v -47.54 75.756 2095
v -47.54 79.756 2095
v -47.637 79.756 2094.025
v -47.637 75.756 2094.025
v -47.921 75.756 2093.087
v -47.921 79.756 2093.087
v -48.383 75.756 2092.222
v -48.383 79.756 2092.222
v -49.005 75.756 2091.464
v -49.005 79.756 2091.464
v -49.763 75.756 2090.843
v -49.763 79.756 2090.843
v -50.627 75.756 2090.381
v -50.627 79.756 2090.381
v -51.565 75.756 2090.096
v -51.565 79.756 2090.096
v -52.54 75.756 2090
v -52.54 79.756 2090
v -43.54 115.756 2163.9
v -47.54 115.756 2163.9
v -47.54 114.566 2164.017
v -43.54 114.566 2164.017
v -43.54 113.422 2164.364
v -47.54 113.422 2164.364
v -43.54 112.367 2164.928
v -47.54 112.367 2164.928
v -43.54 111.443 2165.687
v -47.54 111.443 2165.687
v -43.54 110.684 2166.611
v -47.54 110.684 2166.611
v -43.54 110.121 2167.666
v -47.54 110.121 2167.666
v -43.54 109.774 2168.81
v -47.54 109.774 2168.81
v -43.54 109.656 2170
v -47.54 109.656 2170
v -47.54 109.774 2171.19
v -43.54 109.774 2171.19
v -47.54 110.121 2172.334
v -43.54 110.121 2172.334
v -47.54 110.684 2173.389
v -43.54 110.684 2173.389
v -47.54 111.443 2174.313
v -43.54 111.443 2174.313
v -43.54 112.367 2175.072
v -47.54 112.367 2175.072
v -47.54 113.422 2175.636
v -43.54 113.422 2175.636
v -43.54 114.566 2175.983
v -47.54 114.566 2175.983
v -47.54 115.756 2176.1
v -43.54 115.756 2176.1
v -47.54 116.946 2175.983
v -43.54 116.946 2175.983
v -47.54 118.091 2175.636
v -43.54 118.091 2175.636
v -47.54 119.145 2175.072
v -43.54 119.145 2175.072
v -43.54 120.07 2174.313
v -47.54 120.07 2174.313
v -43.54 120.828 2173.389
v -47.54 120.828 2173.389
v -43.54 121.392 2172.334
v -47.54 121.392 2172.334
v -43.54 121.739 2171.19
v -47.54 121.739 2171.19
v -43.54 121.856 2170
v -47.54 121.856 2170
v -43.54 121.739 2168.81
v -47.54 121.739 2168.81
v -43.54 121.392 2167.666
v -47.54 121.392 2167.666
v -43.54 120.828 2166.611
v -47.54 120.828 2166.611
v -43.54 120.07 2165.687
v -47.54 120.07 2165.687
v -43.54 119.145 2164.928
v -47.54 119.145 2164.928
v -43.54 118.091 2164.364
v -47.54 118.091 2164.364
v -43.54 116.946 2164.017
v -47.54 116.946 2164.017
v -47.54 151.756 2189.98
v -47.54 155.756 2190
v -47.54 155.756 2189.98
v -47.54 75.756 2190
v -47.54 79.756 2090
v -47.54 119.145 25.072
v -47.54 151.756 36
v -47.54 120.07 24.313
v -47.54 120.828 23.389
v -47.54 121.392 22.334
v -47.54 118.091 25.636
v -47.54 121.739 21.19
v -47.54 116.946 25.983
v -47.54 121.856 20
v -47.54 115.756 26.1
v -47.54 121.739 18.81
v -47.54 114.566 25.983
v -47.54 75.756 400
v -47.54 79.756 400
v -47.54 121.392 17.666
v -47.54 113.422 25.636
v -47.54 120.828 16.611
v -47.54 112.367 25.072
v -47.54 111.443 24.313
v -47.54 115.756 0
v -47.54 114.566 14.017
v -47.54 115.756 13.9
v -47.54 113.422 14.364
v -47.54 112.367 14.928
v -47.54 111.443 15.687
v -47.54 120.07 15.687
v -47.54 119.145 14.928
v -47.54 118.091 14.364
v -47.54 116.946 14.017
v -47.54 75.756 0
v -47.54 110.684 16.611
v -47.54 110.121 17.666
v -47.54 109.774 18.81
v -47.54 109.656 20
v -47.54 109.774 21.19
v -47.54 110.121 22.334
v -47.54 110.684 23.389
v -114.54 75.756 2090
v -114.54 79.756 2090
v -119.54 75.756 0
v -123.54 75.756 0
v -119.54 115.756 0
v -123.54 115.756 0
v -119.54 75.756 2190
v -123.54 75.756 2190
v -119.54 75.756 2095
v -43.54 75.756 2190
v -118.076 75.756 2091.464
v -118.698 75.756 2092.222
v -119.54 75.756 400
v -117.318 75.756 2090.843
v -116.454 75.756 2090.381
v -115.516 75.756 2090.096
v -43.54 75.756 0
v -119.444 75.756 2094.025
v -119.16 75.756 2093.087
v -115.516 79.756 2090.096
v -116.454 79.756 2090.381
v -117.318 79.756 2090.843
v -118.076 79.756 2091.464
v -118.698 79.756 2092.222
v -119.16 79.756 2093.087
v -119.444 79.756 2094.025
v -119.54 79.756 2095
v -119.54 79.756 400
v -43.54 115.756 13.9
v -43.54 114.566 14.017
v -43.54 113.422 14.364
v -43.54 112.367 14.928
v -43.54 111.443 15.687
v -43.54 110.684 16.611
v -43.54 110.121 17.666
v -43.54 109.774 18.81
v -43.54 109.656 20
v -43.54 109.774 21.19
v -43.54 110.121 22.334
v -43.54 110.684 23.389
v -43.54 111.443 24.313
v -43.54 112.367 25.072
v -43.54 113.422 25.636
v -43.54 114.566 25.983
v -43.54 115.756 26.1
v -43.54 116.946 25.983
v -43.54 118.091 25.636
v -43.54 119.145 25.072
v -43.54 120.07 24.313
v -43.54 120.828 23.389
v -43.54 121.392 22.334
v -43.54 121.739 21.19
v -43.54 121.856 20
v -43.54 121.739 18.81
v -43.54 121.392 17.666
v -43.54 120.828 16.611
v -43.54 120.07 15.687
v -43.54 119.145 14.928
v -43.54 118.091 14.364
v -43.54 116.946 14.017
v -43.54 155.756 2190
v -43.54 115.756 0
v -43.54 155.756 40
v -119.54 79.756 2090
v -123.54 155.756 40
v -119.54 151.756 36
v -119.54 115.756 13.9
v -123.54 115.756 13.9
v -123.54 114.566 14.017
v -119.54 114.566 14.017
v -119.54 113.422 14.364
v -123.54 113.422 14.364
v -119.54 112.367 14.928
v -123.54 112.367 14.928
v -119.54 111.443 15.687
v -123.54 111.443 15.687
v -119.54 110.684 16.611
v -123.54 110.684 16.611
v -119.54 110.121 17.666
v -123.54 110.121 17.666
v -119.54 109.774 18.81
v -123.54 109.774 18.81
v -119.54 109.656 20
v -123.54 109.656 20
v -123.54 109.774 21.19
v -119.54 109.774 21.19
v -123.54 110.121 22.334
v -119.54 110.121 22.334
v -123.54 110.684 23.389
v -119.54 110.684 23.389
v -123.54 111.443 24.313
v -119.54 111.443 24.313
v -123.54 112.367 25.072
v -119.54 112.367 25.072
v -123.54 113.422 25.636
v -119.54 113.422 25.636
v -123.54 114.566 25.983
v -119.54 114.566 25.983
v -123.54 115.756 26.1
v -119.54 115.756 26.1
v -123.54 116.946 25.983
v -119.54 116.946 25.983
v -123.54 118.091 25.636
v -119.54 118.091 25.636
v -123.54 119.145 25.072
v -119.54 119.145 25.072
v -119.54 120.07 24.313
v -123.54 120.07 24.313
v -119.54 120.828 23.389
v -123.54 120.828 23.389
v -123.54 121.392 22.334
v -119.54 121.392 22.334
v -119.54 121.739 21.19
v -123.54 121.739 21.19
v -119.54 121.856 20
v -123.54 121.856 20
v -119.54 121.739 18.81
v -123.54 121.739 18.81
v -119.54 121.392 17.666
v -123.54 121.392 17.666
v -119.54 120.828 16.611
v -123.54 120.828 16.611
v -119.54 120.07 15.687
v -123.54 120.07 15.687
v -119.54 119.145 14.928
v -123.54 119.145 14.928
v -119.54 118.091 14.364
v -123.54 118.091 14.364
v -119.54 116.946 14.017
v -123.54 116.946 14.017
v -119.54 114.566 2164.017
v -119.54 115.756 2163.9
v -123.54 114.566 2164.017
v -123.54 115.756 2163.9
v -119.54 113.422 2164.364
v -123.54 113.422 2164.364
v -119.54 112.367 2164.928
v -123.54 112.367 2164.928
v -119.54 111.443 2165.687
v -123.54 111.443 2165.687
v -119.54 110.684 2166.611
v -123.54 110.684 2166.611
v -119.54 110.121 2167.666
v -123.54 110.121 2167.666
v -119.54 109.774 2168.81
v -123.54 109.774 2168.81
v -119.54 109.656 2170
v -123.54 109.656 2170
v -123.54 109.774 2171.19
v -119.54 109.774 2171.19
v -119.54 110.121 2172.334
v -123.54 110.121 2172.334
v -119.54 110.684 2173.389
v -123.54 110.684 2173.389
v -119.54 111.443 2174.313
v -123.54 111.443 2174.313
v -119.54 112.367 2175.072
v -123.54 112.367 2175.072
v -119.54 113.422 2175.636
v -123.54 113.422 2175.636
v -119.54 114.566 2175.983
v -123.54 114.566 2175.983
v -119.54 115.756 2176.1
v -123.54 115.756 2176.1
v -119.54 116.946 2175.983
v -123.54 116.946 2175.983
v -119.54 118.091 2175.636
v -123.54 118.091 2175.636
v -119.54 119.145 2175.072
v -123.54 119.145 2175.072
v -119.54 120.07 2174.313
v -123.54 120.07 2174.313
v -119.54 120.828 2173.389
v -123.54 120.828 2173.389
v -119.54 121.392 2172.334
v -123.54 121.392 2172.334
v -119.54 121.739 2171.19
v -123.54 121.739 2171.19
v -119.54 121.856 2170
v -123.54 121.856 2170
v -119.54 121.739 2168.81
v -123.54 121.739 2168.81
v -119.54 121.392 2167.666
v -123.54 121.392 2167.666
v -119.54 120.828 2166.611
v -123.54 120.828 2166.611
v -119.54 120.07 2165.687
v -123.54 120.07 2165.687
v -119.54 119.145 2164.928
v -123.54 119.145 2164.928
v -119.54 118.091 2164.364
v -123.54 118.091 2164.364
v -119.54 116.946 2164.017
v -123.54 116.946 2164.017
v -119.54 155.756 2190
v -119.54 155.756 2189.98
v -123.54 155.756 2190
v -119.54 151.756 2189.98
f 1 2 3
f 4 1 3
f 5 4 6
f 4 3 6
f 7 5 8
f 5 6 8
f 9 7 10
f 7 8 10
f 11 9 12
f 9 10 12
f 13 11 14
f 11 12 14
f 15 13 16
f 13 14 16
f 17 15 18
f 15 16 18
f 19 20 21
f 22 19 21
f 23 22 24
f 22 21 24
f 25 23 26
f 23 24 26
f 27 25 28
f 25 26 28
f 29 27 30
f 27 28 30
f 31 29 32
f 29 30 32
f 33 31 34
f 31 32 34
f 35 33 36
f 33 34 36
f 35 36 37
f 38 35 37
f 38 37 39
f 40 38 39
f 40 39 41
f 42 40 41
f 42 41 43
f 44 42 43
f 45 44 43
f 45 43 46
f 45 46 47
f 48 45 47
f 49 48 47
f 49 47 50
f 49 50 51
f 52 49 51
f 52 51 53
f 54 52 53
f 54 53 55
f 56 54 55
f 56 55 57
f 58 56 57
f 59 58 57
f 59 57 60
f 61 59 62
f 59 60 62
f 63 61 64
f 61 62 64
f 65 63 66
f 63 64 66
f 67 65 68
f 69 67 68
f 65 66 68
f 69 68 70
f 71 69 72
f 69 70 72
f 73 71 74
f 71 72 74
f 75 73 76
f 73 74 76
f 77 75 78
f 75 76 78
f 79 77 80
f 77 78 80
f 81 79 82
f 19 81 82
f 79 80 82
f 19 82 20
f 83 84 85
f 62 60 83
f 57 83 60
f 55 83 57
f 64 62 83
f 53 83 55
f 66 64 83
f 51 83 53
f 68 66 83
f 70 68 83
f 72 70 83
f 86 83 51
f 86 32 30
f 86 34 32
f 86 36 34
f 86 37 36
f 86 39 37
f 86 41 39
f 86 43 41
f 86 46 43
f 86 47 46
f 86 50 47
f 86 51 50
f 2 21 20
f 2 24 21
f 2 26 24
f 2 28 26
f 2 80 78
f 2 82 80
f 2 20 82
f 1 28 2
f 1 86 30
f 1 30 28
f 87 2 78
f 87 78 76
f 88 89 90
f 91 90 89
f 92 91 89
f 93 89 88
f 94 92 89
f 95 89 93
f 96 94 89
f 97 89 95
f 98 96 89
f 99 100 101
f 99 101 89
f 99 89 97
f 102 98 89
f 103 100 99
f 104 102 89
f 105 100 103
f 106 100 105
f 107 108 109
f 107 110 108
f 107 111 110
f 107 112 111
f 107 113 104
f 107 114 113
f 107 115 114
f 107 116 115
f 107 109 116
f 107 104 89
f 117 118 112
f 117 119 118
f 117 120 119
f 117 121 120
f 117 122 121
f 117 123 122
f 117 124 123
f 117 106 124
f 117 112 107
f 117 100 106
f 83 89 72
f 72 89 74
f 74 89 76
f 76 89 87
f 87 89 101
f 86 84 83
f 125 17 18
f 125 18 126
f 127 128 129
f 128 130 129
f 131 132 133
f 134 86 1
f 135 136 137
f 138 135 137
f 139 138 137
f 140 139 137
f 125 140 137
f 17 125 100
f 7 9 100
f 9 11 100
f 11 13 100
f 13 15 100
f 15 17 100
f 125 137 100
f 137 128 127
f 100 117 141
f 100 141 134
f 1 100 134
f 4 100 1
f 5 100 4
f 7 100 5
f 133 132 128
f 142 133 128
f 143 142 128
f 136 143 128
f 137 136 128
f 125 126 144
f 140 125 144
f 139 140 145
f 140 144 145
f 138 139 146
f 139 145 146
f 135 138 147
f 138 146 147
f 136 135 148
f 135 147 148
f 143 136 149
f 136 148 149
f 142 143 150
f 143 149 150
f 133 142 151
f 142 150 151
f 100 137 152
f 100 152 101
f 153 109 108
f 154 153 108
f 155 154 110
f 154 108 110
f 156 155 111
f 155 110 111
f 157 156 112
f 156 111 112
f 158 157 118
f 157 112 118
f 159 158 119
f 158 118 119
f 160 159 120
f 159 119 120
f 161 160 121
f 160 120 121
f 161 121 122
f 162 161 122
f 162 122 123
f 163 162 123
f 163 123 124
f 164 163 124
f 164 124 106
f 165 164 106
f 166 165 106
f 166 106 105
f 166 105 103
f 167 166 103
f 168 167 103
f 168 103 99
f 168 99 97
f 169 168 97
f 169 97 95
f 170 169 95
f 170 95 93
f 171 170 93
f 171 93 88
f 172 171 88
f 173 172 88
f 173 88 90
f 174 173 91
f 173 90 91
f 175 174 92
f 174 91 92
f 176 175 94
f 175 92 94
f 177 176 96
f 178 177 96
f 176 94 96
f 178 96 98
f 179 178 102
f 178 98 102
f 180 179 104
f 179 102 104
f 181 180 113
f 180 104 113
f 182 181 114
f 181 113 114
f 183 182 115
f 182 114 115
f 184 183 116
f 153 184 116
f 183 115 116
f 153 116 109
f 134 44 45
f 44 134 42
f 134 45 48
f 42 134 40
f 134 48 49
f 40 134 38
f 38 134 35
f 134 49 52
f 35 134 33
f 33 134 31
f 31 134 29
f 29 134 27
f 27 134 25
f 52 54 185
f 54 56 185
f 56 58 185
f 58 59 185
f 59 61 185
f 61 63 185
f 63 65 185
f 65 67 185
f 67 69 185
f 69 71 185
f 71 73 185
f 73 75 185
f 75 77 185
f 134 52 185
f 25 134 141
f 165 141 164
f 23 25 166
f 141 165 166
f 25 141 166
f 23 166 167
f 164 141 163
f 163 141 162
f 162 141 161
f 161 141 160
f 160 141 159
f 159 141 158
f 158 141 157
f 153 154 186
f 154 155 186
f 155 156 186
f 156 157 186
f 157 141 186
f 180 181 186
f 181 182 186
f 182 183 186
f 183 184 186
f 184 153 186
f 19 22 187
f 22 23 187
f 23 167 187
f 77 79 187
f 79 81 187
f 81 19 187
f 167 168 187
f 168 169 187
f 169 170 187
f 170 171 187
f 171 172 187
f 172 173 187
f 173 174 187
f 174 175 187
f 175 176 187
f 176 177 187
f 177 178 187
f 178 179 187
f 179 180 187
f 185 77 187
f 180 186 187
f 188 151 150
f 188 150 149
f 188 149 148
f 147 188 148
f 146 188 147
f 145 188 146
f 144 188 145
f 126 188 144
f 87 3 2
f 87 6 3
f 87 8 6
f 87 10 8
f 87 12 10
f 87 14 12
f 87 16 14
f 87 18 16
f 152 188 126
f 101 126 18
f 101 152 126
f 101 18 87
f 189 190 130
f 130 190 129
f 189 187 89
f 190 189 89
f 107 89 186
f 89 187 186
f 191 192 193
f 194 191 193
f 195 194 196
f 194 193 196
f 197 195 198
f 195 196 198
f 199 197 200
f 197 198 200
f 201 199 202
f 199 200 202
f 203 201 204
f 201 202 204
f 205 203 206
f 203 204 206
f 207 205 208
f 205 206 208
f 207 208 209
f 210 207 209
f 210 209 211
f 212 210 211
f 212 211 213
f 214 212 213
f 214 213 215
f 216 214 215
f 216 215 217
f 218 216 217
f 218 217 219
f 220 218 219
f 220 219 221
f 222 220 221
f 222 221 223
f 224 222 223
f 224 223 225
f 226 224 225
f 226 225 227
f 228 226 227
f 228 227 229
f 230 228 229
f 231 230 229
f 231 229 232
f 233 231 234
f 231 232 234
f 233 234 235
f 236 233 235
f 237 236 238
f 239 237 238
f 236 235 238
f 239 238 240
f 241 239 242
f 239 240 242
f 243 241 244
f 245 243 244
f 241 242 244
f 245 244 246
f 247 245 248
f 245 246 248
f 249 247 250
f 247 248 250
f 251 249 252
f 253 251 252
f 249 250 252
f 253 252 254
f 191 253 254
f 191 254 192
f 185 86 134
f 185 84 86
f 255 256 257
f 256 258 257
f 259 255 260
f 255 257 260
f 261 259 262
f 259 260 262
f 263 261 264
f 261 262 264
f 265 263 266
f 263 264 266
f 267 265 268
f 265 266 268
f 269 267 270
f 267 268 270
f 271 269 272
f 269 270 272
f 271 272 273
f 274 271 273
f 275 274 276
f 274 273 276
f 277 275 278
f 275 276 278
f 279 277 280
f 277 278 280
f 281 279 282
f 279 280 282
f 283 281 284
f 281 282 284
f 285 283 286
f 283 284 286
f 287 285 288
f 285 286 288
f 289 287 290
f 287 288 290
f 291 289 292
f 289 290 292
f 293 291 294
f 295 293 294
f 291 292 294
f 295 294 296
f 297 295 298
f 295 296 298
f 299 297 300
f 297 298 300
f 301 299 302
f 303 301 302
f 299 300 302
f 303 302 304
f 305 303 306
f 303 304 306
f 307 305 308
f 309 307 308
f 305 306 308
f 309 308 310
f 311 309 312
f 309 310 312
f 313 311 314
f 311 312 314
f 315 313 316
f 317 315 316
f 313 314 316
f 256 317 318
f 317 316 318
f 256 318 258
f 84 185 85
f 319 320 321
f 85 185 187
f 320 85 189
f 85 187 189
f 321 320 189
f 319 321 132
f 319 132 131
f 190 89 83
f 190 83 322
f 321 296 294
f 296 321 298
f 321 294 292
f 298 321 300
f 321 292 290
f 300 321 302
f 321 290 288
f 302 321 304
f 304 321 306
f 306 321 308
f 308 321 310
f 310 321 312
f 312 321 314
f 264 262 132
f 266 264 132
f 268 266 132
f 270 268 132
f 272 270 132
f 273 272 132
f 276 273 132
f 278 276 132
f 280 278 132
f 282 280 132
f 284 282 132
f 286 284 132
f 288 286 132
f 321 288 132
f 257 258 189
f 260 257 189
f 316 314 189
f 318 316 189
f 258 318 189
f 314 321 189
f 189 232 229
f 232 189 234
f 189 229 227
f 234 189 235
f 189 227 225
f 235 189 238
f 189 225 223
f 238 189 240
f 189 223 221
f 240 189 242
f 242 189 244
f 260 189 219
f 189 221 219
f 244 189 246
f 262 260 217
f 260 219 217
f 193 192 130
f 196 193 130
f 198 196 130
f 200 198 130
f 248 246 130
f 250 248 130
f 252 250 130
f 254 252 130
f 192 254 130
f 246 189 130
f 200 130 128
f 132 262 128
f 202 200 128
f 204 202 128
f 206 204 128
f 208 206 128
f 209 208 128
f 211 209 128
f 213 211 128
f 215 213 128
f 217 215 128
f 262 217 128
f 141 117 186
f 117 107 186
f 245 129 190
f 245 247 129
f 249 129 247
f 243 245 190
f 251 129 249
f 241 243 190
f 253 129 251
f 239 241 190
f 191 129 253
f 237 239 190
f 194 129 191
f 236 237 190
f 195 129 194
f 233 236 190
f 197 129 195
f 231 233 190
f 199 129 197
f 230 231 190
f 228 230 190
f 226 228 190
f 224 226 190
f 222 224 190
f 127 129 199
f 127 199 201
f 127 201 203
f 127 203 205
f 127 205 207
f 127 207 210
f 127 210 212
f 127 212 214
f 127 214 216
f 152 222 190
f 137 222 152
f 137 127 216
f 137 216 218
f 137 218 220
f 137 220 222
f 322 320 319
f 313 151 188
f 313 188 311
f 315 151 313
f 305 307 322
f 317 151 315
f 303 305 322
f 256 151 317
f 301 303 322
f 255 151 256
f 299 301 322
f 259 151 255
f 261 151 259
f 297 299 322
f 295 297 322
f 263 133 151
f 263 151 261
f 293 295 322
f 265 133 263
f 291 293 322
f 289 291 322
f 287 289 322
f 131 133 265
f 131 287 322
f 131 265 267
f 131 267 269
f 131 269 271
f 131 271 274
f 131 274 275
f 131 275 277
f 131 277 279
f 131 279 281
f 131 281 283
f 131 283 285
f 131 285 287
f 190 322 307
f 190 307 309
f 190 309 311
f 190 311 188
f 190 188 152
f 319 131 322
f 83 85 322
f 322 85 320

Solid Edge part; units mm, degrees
sketch "Sketch1" plane through (0, 0, 0) normal (0, 0, 1) x (1, 0, 0)
  line L0 (-119.5405, 79.7564) -> (-47.5405, 79.7564)
  line L1 (-47.5405, 79.7564) -> (-47.5405, 151.7564)
  line L2 (-47.5405, 151.7564) -> (-119.5405, 151.7564)
  line L3 (-119.5405, 151.7564) -> (-119.5405, 79.7564)
  line L4 (-123.5405, 75.7564) -> (-43.5405, 75.7564)
  line L5 (-43.5405, 75.7564) -> (-43.5405, 155.7564)
  line L6 (-43.5405, 155.7564) -> (-123.5405, 155.7564)
  line L7 (-123.5405, 155.7564) -> (-123.5405, 75.7564)
  dimension "D1" = 80
  dimension "D2" = 80
  dimension "D3" = 4
  dimension "D4" = 4
extrude "Protrusion1" add sketch "Sketch1" along normal blind 2190
sketch "Sketch2" plane through (-123.5405, 105.7564, 960) normal (-1, 0, 0) x (0, 0, -1)
  circle A0 centre (940, -10) radius 6.1
  circle A1 centre (-1210, -10) radius 6.1
  dimension "D1" = 12.2
  dimension "D2" = 12.2
  dimension "D3" = 20
  dimension "D4" = 20
extrude "Cutout1" cut sketch "Sketch2" against normal through all
sketch "Sketch3" plane through (-68.5405, 155.7564, 960) normal (0, 1, 0) x (0, 0, -1)
  line L0 (-1230, -21) -> (-1229.99, -21)
  line L1 (-1229.99, -21) -> (-1229.99, 51)
  line L2 (-1229.99, 51) -> (-1230, 51)
  line L3 (-1230, 51) -> (-1230, -21)
  dimension "D1" = 0.01
  dimension "D2" = 72
extrude "Cutout2" cut sketch "Sketch3" against normal blind 5
sketch "Sketch4" plane through (-43.5405, 100.7564, 960) normal (1, 0, 0) x (0, 0, 1)
  line L0 (-920, -55) -> (-960, -15)
  line L1 (-960, -15) -> (-960, -55)
  line L2 (-960, -55) -> (-920, -55)
  dimension "D1" = 40
extrude "Cutout3" cut sketch "Sketch4" against normal through all
sketch "Sketch5" plane through (-83.5405, 75.7564, 1095) normal (0, -1, 0) x (0, 0, 1)
  line L0 (995, 36) -> (1095, 36)
  line L1 (1095, 36) -> (1095, -36)
  line L2 (1095, -36) -> (995, -36)
  line L3 (995, -36) -> (995, 36)
  line L4 (-1095, 36) -> (-695, 36)
  line L5 (-695, 36) -> (-695, -36)
  line L6 (-695, -36) -> (-1095, -36)
  line L7 (-1095, -36) -> (-1095, 36)
  dimension "D1" = 72
  dimension "D2" = 400
  dimension "D3" = 100
  dimension "D4" = 72
extrude "Cutout4" cut sketch "Sketch5" against normal up to next
sketch "Sketch6" plane through (-83.5405, 155.7564, 1115) normal (0, 1, 0) x (0, 0, -1)
  line L0 (-1074.99, -36) -> (-1074.98, -36)
  line L1 (-1074.98, -36) -> (-1074.98, 36)
  line L2 (-1074.98, 36) -> (-1074.99, 36)
  line L3 (-1074.99, 36) -> (-1074.99, -36)
  dimension "D1" = 72
  dimension "D2" = 0.01
extrude "Cutout5" cut sketch "Sketch6" against normal up to next
fillet "Round1" radius 5 2 edges at (-119.5405, 77.7564, 2090) (-47.5405, 77.7564, 2090)
properties material "Aluminum, 6061-T6"
